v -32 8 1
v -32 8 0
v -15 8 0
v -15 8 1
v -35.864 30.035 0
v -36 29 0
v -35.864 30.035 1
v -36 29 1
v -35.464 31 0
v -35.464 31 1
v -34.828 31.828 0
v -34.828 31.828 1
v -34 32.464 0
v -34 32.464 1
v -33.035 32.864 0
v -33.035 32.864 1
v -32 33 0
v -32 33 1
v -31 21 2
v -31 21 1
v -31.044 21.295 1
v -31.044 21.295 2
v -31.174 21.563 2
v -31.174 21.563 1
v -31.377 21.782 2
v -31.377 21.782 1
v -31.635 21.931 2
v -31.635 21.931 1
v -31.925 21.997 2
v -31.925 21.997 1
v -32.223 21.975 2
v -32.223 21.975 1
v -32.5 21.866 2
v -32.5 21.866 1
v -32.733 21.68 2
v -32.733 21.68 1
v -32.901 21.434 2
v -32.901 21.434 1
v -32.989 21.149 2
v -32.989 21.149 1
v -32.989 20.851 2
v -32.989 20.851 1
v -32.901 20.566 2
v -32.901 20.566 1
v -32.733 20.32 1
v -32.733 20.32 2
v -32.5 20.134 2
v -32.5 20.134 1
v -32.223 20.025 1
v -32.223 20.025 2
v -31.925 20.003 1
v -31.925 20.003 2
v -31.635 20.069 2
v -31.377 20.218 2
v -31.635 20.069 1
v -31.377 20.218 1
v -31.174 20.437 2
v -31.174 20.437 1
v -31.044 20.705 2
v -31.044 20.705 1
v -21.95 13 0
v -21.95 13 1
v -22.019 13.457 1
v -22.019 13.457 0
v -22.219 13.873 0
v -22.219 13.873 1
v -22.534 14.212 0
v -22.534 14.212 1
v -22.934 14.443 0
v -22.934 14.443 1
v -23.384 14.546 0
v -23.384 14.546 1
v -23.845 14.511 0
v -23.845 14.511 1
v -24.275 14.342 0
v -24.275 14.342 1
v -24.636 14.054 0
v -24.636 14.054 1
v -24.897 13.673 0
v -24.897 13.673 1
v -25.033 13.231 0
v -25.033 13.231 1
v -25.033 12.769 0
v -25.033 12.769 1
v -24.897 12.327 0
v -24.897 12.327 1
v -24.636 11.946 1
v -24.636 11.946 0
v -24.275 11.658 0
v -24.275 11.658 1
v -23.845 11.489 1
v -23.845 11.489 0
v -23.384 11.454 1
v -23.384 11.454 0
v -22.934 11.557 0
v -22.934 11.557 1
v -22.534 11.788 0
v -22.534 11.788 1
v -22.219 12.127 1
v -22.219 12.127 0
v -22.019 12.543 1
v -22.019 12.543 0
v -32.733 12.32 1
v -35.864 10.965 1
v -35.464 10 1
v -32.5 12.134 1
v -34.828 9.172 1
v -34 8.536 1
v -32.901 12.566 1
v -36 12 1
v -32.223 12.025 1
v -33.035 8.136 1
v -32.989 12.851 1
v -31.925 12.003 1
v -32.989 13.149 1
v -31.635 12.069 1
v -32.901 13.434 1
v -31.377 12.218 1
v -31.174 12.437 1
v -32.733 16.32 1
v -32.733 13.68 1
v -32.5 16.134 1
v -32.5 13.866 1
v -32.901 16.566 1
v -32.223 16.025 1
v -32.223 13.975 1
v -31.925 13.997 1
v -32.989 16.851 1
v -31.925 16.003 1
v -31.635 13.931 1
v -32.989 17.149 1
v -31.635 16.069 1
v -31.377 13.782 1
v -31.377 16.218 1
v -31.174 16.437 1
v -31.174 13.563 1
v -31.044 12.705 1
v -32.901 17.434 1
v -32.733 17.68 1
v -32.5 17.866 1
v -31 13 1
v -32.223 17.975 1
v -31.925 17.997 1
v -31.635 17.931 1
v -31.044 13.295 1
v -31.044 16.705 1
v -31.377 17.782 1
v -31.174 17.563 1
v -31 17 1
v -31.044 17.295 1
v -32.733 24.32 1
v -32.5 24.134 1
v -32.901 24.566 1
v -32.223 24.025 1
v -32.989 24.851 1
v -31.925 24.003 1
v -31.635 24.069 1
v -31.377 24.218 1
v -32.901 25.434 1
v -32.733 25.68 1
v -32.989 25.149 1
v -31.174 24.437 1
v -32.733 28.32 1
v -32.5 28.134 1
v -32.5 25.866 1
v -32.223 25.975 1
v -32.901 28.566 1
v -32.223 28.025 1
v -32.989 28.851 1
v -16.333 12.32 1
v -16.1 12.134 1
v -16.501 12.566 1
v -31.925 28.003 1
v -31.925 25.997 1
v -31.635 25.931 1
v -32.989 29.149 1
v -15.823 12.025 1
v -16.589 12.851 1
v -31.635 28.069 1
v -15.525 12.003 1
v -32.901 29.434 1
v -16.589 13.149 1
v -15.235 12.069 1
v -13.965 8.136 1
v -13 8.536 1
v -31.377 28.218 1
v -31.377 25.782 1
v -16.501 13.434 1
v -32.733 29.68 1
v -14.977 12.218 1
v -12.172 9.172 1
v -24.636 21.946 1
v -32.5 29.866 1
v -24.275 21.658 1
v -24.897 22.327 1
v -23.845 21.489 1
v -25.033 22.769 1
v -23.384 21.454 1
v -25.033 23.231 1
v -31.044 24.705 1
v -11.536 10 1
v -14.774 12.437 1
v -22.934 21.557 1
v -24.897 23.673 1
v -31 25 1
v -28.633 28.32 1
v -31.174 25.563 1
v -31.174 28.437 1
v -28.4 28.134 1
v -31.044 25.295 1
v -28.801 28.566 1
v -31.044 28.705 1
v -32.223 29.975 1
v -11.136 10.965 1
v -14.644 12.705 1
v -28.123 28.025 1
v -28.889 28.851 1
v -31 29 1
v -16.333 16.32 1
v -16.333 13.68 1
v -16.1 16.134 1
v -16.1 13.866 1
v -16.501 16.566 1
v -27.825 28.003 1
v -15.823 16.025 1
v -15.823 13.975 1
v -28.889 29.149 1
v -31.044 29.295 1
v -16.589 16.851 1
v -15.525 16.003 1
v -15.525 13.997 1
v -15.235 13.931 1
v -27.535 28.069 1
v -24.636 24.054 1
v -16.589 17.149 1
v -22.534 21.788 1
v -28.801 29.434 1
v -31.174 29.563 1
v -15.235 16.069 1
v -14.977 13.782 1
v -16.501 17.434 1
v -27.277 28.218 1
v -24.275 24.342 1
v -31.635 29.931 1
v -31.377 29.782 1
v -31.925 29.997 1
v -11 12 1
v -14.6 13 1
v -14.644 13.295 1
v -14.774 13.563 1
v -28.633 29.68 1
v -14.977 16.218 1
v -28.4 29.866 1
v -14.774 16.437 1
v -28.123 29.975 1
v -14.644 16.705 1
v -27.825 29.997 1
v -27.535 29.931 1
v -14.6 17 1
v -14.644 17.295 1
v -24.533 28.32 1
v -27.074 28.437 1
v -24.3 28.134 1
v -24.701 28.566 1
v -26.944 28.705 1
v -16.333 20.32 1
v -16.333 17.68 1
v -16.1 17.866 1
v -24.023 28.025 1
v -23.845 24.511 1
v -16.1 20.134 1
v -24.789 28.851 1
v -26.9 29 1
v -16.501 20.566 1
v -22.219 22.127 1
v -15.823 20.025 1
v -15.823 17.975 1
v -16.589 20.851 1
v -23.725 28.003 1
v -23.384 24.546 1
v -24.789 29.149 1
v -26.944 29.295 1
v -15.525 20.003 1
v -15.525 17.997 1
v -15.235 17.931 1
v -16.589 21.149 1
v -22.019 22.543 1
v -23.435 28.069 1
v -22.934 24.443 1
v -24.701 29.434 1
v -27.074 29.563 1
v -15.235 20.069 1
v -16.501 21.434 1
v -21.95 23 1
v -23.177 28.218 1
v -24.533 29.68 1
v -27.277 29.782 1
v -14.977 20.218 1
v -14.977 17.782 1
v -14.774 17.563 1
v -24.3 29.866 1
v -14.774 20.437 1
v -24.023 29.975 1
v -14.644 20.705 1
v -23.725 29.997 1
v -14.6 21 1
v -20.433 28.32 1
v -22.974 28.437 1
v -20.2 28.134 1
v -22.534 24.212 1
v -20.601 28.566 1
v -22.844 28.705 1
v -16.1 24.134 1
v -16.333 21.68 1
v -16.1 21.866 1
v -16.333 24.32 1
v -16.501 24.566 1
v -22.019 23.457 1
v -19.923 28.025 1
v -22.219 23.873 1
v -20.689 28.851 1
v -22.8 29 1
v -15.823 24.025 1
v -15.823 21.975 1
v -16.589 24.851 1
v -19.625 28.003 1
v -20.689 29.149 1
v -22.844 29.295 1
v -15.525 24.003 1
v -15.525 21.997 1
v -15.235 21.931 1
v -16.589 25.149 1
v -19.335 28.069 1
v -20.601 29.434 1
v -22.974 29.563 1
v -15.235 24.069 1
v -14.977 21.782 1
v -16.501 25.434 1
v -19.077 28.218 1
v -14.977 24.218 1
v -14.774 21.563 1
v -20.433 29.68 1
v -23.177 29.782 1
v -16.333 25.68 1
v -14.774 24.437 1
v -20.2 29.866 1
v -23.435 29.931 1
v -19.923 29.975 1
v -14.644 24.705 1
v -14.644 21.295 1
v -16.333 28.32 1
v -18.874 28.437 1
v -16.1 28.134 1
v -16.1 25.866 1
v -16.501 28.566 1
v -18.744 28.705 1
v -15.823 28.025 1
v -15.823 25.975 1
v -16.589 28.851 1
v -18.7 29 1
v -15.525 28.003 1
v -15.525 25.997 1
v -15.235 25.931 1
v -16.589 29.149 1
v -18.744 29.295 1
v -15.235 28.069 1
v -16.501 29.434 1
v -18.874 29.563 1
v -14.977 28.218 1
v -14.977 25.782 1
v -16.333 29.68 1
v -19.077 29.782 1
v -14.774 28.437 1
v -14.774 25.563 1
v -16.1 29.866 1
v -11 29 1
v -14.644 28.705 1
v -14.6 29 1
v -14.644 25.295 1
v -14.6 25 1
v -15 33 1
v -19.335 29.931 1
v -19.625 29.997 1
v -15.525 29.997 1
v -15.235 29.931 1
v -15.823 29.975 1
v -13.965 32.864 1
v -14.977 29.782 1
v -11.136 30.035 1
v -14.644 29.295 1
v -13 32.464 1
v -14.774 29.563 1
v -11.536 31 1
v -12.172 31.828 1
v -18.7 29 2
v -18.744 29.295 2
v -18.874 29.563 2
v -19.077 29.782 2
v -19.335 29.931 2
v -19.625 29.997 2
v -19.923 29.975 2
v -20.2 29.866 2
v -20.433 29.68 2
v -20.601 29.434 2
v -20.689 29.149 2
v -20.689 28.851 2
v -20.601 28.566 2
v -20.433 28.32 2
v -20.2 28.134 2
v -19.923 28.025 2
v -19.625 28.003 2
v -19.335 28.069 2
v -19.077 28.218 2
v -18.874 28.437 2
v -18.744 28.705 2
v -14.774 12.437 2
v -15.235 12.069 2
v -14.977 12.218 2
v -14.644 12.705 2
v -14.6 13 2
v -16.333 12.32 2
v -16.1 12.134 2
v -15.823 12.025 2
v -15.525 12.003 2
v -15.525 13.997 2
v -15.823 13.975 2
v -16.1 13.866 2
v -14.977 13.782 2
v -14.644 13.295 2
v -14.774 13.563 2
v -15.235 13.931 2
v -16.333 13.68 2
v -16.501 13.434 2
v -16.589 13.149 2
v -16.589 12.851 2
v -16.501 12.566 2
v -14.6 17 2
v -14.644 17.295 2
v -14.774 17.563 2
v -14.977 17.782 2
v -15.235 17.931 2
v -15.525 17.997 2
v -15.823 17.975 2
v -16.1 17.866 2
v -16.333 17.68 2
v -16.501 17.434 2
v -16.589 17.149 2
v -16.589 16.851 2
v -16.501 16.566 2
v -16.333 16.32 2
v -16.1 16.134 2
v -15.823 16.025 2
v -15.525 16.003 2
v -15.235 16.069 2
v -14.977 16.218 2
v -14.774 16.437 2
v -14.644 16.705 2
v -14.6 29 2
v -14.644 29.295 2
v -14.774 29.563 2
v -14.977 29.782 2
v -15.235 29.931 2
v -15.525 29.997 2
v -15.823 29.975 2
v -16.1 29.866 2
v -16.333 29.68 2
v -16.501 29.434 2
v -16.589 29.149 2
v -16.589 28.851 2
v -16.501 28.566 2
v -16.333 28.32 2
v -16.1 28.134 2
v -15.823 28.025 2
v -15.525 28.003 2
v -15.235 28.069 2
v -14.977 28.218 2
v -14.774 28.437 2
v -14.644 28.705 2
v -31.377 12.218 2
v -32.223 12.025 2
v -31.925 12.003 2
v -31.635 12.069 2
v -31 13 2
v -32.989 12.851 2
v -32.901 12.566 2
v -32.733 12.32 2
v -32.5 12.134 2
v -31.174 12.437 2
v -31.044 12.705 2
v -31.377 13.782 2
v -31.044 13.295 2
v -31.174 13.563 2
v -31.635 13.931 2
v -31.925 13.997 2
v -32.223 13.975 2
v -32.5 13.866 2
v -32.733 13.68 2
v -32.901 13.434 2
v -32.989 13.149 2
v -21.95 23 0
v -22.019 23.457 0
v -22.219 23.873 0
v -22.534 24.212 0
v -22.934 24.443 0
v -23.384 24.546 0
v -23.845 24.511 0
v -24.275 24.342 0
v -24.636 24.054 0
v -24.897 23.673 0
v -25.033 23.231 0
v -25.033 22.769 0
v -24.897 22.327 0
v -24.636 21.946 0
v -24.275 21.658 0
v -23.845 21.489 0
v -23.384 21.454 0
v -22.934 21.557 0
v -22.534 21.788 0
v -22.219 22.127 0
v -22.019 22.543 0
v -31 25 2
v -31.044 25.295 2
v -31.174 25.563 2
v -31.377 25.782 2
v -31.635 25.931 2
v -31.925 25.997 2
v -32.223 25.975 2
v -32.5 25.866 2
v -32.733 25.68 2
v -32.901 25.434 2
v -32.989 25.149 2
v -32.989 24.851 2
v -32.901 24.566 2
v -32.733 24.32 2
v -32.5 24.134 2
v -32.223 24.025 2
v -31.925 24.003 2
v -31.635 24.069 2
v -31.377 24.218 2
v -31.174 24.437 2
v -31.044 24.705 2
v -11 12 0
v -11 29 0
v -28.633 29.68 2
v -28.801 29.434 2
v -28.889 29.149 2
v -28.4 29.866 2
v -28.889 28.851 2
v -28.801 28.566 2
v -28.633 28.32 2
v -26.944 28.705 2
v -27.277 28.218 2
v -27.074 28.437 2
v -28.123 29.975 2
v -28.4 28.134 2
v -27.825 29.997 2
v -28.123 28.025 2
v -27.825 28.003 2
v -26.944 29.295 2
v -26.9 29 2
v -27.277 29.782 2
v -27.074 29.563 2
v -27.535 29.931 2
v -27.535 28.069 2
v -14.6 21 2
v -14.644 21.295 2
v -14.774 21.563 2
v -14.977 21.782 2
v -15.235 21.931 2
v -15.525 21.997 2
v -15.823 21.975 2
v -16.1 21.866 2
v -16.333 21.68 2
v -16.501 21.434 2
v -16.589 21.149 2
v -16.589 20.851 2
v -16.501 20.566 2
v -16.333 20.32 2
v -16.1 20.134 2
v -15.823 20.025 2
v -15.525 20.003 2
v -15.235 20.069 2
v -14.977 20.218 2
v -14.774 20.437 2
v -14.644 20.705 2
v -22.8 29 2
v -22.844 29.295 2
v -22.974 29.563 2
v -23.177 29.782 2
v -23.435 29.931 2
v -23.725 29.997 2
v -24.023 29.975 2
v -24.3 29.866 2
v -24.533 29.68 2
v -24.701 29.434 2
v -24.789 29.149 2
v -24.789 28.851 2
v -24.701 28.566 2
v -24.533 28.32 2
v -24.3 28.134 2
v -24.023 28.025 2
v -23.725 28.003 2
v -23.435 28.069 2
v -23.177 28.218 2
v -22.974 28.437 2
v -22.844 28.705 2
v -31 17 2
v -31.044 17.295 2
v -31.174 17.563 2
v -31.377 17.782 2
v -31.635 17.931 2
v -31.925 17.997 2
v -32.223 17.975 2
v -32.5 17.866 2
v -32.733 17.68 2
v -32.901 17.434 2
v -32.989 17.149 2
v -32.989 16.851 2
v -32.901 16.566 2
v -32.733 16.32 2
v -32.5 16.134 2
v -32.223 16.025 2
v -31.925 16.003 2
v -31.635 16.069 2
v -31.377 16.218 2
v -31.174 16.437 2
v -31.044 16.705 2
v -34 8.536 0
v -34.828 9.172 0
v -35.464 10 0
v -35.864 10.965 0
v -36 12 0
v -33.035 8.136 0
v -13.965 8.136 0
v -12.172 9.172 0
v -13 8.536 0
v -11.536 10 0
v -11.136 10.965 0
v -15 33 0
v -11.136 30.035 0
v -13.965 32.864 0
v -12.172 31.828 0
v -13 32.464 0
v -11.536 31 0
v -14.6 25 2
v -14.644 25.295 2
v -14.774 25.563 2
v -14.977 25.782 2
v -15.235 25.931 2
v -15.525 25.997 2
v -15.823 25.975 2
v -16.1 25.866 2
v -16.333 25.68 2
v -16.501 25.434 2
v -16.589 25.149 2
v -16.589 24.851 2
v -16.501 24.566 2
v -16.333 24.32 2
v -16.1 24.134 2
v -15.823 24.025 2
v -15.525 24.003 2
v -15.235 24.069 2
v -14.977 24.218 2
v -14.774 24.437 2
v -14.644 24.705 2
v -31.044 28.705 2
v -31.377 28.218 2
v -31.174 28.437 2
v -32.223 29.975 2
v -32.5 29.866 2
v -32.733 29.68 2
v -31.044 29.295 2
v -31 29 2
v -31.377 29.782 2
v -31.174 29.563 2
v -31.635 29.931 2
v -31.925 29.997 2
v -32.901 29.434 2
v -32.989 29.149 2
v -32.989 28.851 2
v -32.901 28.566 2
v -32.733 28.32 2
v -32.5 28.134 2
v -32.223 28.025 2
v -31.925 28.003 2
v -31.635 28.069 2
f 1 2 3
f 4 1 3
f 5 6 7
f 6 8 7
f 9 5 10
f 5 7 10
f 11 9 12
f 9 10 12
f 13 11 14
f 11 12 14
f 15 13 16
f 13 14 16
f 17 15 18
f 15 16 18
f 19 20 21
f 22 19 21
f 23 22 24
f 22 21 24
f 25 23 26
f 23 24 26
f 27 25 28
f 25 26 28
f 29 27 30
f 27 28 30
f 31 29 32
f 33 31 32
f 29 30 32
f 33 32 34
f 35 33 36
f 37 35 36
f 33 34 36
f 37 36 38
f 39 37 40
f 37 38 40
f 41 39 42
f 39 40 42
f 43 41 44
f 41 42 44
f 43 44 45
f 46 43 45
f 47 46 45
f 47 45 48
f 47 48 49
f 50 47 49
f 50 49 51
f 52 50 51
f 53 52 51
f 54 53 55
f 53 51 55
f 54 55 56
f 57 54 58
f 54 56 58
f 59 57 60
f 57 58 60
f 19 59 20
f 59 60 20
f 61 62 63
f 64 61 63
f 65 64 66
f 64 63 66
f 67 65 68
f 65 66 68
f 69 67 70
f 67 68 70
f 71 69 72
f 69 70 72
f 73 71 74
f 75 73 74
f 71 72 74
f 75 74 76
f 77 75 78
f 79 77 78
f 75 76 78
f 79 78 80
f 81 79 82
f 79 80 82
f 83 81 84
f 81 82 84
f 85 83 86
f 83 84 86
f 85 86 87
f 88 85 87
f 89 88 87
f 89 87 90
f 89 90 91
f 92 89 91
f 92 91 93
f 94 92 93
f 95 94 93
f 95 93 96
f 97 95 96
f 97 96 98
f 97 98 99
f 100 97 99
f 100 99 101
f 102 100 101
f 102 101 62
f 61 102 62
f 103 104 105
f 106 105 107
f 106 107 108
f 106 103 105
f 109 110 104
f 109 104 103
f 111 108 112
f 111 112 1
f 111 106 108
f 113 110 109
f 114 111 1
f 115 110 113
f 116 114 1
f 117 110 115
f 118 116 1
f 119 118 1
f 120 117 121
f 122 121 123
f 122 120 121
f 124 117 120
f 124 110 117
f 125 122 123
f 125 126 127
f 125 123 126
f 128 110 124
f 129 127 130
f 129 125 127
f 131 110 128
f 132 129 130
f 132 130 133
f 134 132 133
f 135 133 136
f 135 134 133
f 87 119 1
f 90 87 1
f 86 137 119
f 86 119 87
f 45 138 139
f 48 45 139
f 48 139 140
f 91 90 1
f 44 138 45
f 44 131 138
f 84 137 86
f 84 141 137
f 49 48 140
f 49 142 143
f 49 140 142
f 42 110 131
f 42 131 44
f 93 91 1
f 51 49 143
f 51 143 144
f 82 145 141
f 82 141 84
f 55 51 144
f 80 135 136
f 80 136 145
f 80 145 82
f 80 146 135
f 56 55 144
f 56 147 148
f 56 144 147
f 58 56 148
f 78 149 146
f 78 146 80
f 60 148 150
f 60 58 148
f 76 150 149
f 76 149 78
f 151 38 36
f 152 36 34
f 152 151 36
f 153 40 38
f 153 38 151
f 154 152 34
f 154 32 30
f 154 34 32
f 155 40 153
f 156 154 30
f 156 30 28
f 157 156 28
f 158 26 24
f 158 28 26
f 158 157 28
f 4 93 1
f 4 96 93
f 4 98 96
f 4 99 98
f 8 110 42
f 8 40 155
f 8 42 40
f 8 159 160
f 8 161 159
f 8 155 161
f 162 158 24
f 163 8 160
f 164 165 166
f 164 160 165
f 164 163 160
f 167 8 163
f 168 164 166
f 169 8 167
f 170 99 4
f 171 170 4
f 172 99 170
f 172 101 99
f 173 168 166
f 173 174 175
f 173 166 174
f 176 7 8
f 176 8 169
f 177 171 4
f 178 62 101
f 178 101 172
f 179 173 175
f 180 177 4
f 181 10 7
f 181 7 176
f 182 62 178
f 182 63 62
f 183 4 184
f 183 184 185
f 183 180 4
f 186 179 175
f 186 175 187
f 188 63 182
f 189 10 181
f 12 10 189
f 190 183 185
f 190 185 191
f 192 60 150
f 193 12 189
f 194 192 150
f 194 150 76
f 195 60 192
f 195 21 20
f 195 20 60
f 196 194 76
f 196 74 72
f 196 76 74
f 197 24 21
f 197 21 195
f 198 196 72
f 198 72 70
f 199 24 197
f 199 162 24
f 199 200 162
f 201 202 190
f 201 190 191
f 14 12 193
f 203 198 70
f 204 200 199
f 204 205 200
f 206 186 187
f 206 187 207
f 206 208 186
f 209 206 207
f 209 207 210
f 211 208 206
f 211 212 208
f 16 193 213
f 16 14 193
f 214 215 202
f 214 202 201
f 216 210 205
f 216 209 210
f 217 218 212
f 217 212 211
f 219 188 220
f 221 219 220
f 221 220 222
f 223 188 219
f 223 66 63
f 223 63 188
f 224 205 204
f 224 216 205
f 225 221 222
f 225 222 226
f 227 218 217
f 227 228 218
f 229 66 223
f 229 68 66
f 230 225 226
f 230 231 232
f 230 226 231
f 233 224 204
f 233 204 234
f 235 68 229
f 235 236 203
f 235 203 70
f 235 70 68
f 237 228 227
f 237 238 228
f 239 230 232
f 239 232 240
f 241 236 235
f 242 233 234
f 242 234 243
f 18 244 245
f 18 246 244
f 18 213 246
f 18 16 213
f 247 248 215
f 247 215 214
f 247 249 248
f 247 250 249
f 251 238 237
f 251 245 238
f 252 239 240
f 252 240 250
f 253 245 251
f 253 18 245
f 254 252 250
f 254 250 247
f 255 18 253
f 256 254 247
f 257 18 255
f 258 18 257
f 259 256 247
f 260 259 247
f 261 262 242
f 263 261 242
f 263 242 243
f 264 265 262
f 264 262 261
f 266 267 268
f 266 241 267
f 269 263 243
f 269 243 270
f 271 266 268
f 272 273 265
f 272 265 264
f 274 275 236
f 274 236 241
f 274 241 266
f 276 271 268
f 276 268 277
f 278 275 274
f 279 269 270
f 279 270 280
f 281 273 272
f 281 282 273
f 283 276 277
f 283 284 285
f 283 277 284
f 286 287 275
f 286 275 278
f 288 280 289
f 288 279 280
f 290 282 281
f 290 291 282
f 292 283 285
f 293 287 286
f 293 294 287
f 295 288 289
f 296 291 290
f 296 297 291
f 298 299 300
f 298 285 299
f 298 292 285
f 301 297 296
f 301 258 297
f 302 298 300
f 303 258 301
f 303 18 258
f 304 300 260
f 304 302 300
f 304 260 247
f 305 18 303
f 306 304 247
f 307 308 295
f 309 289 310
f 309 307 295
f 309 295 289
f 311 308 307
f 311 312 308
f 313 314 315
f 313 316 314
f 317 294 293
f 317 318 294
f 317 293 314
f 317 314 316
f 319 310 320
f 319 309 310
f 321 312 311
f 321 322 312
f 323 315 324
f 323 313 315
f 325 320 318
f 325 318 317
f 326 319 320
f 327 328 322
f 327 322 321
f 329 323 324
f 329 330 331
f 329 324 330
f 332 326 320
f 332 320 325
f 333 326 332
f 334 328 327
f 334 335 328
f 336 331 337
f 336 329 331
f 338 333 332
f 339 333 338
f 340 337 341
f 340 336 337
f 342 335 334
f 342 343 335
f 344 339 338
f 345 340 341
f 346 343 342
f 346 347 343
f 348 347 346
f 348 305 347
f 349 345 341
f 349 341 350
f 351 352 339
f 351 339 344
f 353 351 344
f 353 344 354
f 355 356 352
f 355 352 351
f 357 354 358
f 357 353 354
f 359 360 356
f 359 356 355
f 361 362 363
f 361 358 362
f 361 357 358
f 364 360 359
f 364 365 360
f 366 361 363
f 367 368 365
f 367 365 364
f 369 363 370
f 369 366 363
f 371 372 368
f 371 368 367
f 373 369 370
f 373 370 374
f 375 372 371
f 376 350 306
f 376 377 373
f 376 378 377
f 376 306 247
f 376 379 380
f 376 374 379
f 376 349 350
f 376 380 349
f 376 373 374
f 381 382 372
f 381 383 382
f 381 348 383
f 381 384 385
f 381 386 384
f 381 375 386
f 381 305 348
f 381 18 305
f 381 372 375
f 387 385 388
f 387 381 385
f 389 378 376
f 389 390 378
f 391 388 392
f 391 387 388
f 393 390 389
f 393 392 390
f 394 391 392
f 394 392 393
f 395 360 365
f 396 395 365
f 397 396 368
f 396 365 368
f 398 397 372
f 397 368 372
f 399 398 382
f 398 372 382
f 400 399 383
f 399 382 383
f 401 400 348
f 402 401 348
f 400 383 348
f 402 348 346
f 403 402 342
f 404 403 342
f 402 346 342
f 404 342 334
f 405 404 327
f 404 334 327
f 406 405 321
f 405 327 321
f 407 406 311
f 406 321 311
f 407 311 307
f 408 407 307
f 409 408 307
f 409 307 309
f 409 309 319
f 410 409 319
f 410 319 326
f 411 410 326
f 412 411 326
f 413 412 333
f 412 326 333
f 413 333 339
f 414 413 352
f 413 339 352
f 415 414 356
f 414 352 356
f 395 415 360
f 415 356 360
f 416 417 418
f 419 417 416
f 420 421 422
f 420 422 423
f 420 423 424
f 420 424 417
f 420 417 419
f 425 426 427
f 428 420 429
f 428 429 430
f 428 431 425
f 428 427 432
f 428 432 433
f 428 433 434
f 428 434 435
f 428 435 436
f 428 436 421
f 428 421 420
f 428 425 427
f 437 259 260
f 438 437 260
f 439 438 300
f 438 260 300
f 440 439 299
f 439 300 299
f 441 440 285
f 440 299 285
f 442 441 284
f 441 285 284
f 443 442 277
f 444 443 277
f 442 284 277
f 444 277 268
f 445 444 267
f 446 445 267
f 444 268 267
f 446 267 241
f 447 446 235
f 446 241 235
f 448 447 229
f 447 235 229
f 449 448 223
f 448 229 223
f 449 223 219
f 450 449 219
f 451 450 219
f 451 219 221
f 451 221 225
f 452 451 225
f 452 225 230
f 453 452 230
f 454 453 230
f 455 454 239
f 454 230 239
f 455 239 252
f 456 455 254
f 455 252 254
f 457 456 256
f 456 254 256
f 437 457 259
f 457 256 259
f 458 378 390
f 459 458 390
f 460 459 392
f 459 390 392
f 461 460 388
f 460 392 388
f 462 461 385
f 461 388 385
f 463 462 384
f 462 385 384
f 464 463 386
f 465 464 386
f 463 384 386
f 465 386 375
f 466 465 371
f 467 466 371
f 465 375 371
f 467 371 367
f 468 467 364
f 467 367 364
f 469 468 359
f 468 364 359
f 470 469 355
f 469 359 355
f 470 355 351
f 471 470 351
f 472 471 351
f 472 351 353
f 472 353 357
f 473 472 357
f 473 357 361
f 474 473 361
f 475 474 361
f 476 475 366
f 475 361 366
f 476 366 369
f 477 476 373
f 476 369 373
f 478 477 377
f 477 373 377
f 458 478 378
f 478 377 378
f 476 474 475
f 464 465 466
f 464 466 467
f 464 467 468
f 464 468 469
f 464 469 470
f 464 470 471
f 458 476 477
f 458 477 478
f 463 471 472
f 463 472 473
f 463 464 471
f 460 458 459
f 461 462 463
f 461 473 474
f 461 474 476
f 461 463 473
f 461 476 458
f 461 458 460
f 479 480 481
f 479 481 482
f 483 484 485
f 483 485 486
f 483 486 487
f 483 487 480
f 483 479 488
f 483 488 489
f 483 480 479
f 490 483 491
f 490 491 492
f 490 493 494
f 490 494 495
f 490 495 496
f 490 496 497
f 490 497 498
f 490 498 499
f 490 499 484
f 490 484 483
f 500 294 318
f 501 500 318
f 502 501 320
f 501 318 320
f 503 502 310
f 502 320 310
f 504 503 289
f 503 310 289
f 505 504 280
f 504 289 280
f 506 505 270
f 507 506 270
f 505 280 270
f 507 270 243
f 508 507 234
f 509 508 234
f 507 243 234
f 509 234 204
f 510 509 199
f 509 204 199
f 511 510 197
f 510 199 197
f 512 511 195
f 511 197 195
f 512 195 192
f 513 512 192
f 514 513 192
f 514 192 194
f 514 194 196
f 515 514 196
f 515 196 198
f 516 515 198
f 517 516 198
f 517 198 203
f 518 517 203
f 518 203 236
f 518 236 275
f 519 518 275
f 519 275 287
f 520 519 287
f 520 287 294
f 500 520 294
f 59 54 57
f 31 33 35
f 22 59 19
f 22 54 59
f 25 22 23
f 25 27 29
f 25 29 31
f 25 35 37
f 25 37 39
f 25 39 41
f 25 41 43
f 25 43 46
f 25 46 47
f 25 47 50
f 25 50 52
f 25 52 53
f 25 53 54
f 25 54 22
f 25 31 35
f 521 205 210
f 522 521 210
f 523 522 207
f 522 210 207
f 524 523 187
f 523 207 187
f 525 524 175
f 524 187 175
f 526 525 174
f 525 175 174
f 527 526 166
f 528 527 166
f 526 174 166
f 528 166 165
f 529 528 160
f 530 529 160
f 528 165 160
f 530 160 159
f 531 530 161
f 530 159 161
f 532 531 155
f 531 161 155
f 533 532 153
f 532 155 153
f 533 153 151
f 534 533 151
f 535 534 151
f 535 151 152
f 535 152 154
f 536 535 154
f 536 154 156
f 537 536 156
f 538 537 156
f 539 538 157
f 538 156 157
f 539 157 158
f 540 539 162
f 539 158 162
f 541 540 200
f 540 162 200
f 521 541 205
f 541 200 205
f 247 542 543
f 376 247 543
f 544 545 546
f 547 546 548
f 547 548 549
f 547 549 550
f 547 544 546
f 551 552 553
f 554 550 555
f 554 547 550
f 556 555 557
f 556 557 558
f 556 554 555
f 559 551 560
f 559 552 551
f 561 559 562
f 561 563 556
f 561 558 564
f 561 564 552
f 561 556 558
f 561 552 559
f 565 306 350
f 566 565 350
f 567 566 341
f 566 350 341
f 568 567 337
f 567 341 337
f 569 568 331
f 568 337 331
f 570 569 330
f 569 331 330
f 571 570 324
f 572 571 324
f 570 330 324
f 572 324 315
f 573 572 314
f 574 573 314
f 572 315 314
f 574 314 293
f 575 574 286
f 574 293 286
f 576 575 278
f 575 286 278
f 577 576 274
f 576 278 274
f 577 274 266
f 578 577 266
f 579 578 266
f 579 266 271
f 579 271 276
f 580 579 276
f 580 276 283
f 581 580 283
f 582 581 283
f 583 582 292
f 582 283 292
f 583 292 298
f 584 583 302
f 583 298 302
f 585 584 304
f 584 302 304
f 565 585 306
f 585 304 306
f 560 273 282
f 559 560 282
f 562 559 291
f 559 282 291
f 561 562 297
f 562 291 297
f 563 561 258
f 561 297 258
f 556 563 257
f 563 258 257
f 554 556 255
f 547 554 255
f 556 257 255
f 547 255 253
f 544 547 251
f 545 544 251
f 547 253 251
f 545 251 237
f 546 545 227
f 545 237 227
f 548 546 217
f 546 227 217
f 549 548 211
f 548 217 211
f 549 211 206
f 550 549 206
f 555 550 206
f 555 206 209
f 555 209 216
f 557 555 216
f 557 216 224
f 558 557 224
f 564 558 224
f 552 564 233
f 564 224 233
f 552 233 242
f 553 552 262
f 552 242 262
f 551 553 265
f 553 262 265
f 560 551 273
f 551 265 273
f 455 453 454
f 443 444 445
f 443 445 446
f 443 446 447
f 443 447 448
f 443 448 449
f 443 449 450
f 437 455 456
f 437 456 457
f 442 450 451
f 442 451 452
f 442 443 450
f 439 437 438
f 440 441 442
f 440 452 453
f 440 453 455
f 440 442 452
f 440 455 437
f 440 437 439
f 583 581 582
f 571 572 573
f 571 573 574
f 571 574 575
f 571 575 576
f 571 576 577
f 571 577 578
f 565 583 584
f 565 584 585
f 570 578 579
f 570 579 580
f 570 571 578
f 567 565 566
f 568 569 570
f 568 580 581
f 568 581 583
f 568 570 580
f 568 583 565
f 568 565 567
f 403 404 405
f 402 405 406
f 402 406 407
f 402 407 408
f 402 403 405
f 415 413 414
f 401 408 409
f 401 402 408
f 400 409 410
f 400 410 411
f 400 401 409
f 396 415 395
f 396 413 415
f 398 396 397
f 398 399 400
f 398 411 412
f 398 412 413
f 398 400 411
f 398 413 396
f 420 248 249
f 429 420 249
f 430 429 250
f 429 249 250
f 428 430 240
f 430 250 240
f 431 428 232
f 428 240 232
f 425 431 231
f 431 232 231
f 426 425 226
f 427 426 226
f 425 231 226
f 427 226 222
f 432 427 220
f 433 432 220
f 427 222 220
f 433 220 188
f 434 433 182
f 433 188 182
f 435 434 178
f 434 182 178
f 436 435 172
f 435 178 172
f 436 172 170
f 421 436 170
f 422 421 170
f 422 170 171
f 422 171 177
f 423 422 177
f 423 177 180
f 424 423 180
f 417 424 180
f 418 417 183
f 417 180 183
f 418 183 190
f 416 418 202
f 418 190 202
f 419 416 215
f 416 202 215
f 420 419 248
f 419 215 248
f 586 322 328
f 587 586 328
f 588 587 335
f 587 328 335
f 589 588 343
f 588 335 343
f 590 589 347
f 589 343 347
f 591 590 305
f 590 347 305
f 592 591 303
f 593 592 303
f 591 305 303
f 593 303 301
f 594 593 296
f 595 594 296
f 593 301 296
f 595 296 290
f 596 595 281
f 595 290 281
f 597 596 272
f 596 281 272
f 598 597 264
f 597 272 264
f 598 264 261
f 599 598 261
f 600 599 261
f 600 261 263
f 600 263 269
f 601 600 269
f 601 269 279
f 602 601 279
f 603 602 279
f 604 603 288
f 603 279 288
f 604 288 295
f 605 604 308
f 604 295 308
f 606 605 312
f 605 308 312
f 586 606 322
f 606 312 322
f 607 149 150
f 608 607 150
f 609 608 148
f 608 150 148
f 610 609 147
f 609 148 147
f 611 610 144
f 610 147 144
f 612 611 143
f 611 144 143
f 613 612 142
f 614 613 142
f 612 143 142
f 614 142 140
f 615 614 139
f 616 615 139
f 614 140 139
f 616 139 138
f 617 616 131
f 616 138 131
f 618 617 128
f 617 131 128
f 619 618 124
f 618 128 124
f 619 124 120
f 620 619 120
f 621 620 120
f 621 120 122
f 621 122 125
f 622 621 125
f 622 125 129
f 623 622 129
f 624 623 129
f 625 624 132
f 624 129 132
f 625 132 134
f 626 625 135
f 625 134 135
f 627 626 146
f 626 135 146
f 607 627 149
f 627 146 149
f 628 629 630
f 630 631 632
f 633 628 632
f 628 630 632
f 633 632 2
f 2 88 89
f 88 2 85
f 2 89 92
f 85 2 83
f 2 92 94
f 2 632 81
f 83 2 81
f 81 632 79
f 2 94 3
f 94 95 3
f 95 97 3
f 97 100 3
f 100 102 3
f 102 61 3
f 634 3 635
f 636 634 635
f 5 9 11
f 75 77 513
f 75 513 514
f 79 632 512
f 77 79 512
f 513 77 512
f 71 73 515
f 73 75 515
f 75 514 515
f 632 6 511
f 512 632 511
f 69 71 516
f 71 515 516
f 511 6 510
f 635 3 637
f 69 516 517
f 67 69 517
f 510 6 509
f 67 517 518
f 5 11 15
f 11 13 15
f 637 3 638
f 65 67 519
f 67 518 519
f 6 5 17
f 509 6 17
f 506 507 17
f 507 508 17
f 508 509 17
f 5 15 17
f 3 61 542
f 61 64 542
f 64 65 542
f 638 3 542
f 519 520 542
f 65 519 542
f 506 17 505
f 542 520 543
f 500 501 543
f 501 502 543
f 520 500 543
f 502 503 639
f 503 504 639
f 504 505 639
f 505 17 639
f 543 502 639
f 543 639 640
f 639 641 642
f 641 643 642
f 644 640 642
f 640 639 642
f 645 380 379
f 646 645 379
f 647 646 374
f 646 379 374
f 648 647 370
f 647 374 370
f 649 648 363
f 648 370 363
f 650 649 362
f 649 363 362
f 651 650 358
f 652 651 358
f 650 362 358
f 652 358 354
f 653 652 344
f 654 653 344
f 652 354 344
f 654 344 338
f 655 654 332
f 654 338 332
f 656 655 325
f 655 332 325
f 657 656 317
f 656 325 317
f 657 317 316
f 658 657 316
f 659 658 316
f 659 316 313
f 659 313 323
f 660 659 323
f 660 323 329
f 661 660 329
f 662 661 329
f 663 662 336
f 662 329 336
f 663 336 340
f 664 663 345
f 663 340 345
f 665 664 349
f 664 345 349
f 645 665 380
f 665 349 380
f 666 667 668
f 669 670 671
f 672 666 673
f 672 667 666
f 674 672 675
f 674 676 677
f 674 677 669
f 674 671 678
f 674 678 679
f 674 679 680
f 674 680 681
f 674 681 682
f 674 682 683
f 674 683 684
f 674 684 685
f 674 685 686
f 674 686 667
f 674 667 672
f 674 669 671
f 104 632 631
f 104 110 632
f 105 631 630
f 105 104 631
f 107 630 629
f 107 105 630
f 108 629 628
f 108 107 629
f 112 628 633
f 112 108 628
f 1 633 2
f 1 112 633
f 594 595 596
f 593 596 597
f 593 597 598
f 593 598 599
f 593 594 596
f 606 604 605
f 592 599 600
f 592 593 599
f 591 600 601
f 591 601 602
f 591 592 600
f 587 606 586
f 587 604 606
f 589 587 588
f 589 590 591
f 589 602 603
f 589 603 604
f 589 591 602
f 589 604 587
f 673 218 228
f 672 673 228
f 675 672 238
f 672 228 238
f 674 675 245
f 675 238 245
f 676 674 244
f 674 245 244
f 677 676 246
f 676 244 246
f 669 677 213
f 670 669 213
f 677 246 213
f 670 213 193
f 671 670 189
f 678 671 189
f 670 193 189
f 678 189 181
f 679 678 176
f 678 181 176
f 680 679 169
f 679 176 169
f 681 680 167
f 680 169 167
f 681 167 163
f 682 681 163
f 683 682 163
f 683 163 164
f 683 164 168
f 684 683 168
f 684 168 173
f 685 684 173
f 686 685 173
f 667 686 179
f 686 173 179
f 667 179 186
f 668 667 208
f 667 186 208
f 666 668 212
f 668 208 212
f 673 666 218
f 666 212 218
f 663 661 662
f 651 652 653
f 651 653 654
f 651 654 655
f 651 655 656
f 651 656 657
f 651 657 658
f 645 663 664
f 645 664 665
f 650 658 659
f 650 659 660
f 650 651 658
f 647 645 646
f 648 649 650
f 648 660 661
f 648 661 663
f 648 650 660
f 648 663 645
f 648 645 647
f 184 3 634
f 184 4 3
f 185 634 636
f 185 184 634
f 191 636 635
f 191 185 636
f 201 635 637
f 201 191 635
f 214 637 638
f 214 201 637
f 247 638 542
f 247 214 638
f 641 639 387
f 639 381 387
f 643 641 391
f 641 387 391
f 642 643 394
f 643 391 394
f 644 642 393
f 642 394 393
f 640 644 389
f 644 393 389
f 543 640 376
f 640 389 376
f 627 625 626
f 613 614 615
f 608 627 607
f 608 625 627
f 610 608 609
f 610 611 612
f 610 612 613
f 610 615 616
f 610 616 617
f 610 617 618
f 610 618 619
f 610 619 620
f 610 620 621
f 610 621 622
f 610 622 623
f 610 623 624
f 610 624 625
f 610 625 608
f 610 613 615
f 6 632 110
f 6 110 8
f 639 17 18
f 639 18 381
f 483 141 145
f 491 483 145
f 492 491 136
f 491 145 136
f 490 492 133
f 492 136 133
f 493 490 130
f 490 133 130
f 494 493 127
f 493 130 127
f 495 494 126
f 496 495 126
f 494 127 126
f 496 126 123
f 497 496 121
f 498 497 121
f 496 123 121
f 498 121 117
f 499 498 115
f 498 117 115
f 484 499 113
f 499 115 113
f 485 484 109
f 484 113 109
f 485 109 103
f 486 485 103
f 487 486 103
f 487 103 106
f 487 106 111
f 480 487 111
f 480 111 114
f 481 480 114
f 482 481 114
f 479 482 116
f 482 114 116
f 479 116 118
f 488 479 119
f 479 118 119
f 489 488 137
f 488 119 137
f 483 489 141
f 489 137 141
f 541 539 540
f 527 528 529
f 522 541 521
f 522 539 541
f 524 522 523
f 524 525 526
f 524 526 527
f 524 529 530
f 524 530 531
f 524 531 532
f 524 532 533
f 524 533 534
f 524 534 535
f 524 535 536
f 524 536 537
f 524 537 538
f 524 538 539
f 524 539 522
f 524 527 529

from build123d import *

# Parameters (mm, degrees)
SKETCH1_W           = 25
SKETCH1_H           = 25
BOSS_EXTRUDE1_DEPTH = 1
SKETCH2_R           = 1
BOSS_EXTRUDE2_DEPTH = 1
FILLET1_R           = 4
CUT_EXTRUDE1_REACH  = 3
SKETCH3_R           = 1.55


with BuildPart() as part:
    # Sketch1 → Boss-Extrude1 (new body)
    with BuildSketch(Plane.XY):
        with Locations((-23.5, 20.5)):
            Rectangle(SKETCH1_W, SKETCH1_H)
    extrude(amount=BOSS_EXTRUDE1_DEPTH)

    # Sketch2 → Boss-Extrude2 (add)
    with BuildSketch(Plane.XY.offset(1)):
        with Locations((-32, 29)):
            Circle(SKETCH2_R)
        with Locations((-27.9, 29)):
            Circle(SKETCH2_R)
        with Locations((-23.8, 29)):
            Circle(SKETCH2_R)
        with Locations((-19.7, 29)):
            Circle(SKETCH2_R)
        with Locations((-15.6, 29)):
            Circle(SKETCH2_R)
        with Locations((-32, 25)):
            Circle(SKETCH2_R)
        with Locations((-15.6, 25)):
            Circle(SKETCH2_R)
        with Locations((-32, 21)):
            Circle(SKETCH2_R)
        with Locations((-15.6, 21)):
            Circle(SKETCH2_R)
        with Locations((-32, 17)):
            Circle(SKETCH2_R)
        with Locations((-15.6, 17)):
            Circle(SKETCH2_R)
        with Locations((-32, 13)):
            Circle(SKETCH2_R)
        with Locations((-15.6, 13)):
            Circle(SKETCH2_R)
    extrude(amount=BOSS_EXTRUDE2_DEPTH)

    # Fillet1
    fillet1_edges = [part.edges().sort_by_distance(p)[0] for p in [
        (-11, 8, 0.5),
        (-36, 8, 0.5),
        (-36, 33, 0.5),
        (-11, 33, 0.5),
    ]]
    fillet(fillet1_edges, radius=FILLET1_R)

    # Sketch3 → Cut-Extrude1 (cut, up to next)
    with BuildSketch(Plane.XY.offset(1), mode=Mode.PRIVATE) as cut_extrude1_sk1:
        with Locations((-23.5, 23)):
            Circle(SKETCH3_R)
    cut_extrude1_tool1 = extrude(cut_extrude1_sk1.sketch, amount=-CUT_EXTRUDE1_REACH, mode=Mode.PRIVATE) & part.part
    add(cut_extrude1_tool1.solids().sort_by_distance((-23.5, 23, 1))[0], mode=Mode.SUBTRACT)
    # Sketch3 → Cut-Extrude1 (cut, up to next)
    with BuildSketch(Plane.XY.offset(1), mode=Mode.PRIVATE) as cut_extrude1_sk2:
        with Locations((-23.5, 13)):
            Circle(SKETCH3_R)
    cut_extrude1_tool2 = extrude(cut_extrude1_sk2.sketch, amount=-CUT_EXTRUDE1_REACH, mode=Mode.PRIVATE) & part.part
    add(cut_extrude1_tool2.solids().sort_by_distance((-23.5, 13, 1))[0], mode=Mode.SUBTRACT)


solid = part.part
